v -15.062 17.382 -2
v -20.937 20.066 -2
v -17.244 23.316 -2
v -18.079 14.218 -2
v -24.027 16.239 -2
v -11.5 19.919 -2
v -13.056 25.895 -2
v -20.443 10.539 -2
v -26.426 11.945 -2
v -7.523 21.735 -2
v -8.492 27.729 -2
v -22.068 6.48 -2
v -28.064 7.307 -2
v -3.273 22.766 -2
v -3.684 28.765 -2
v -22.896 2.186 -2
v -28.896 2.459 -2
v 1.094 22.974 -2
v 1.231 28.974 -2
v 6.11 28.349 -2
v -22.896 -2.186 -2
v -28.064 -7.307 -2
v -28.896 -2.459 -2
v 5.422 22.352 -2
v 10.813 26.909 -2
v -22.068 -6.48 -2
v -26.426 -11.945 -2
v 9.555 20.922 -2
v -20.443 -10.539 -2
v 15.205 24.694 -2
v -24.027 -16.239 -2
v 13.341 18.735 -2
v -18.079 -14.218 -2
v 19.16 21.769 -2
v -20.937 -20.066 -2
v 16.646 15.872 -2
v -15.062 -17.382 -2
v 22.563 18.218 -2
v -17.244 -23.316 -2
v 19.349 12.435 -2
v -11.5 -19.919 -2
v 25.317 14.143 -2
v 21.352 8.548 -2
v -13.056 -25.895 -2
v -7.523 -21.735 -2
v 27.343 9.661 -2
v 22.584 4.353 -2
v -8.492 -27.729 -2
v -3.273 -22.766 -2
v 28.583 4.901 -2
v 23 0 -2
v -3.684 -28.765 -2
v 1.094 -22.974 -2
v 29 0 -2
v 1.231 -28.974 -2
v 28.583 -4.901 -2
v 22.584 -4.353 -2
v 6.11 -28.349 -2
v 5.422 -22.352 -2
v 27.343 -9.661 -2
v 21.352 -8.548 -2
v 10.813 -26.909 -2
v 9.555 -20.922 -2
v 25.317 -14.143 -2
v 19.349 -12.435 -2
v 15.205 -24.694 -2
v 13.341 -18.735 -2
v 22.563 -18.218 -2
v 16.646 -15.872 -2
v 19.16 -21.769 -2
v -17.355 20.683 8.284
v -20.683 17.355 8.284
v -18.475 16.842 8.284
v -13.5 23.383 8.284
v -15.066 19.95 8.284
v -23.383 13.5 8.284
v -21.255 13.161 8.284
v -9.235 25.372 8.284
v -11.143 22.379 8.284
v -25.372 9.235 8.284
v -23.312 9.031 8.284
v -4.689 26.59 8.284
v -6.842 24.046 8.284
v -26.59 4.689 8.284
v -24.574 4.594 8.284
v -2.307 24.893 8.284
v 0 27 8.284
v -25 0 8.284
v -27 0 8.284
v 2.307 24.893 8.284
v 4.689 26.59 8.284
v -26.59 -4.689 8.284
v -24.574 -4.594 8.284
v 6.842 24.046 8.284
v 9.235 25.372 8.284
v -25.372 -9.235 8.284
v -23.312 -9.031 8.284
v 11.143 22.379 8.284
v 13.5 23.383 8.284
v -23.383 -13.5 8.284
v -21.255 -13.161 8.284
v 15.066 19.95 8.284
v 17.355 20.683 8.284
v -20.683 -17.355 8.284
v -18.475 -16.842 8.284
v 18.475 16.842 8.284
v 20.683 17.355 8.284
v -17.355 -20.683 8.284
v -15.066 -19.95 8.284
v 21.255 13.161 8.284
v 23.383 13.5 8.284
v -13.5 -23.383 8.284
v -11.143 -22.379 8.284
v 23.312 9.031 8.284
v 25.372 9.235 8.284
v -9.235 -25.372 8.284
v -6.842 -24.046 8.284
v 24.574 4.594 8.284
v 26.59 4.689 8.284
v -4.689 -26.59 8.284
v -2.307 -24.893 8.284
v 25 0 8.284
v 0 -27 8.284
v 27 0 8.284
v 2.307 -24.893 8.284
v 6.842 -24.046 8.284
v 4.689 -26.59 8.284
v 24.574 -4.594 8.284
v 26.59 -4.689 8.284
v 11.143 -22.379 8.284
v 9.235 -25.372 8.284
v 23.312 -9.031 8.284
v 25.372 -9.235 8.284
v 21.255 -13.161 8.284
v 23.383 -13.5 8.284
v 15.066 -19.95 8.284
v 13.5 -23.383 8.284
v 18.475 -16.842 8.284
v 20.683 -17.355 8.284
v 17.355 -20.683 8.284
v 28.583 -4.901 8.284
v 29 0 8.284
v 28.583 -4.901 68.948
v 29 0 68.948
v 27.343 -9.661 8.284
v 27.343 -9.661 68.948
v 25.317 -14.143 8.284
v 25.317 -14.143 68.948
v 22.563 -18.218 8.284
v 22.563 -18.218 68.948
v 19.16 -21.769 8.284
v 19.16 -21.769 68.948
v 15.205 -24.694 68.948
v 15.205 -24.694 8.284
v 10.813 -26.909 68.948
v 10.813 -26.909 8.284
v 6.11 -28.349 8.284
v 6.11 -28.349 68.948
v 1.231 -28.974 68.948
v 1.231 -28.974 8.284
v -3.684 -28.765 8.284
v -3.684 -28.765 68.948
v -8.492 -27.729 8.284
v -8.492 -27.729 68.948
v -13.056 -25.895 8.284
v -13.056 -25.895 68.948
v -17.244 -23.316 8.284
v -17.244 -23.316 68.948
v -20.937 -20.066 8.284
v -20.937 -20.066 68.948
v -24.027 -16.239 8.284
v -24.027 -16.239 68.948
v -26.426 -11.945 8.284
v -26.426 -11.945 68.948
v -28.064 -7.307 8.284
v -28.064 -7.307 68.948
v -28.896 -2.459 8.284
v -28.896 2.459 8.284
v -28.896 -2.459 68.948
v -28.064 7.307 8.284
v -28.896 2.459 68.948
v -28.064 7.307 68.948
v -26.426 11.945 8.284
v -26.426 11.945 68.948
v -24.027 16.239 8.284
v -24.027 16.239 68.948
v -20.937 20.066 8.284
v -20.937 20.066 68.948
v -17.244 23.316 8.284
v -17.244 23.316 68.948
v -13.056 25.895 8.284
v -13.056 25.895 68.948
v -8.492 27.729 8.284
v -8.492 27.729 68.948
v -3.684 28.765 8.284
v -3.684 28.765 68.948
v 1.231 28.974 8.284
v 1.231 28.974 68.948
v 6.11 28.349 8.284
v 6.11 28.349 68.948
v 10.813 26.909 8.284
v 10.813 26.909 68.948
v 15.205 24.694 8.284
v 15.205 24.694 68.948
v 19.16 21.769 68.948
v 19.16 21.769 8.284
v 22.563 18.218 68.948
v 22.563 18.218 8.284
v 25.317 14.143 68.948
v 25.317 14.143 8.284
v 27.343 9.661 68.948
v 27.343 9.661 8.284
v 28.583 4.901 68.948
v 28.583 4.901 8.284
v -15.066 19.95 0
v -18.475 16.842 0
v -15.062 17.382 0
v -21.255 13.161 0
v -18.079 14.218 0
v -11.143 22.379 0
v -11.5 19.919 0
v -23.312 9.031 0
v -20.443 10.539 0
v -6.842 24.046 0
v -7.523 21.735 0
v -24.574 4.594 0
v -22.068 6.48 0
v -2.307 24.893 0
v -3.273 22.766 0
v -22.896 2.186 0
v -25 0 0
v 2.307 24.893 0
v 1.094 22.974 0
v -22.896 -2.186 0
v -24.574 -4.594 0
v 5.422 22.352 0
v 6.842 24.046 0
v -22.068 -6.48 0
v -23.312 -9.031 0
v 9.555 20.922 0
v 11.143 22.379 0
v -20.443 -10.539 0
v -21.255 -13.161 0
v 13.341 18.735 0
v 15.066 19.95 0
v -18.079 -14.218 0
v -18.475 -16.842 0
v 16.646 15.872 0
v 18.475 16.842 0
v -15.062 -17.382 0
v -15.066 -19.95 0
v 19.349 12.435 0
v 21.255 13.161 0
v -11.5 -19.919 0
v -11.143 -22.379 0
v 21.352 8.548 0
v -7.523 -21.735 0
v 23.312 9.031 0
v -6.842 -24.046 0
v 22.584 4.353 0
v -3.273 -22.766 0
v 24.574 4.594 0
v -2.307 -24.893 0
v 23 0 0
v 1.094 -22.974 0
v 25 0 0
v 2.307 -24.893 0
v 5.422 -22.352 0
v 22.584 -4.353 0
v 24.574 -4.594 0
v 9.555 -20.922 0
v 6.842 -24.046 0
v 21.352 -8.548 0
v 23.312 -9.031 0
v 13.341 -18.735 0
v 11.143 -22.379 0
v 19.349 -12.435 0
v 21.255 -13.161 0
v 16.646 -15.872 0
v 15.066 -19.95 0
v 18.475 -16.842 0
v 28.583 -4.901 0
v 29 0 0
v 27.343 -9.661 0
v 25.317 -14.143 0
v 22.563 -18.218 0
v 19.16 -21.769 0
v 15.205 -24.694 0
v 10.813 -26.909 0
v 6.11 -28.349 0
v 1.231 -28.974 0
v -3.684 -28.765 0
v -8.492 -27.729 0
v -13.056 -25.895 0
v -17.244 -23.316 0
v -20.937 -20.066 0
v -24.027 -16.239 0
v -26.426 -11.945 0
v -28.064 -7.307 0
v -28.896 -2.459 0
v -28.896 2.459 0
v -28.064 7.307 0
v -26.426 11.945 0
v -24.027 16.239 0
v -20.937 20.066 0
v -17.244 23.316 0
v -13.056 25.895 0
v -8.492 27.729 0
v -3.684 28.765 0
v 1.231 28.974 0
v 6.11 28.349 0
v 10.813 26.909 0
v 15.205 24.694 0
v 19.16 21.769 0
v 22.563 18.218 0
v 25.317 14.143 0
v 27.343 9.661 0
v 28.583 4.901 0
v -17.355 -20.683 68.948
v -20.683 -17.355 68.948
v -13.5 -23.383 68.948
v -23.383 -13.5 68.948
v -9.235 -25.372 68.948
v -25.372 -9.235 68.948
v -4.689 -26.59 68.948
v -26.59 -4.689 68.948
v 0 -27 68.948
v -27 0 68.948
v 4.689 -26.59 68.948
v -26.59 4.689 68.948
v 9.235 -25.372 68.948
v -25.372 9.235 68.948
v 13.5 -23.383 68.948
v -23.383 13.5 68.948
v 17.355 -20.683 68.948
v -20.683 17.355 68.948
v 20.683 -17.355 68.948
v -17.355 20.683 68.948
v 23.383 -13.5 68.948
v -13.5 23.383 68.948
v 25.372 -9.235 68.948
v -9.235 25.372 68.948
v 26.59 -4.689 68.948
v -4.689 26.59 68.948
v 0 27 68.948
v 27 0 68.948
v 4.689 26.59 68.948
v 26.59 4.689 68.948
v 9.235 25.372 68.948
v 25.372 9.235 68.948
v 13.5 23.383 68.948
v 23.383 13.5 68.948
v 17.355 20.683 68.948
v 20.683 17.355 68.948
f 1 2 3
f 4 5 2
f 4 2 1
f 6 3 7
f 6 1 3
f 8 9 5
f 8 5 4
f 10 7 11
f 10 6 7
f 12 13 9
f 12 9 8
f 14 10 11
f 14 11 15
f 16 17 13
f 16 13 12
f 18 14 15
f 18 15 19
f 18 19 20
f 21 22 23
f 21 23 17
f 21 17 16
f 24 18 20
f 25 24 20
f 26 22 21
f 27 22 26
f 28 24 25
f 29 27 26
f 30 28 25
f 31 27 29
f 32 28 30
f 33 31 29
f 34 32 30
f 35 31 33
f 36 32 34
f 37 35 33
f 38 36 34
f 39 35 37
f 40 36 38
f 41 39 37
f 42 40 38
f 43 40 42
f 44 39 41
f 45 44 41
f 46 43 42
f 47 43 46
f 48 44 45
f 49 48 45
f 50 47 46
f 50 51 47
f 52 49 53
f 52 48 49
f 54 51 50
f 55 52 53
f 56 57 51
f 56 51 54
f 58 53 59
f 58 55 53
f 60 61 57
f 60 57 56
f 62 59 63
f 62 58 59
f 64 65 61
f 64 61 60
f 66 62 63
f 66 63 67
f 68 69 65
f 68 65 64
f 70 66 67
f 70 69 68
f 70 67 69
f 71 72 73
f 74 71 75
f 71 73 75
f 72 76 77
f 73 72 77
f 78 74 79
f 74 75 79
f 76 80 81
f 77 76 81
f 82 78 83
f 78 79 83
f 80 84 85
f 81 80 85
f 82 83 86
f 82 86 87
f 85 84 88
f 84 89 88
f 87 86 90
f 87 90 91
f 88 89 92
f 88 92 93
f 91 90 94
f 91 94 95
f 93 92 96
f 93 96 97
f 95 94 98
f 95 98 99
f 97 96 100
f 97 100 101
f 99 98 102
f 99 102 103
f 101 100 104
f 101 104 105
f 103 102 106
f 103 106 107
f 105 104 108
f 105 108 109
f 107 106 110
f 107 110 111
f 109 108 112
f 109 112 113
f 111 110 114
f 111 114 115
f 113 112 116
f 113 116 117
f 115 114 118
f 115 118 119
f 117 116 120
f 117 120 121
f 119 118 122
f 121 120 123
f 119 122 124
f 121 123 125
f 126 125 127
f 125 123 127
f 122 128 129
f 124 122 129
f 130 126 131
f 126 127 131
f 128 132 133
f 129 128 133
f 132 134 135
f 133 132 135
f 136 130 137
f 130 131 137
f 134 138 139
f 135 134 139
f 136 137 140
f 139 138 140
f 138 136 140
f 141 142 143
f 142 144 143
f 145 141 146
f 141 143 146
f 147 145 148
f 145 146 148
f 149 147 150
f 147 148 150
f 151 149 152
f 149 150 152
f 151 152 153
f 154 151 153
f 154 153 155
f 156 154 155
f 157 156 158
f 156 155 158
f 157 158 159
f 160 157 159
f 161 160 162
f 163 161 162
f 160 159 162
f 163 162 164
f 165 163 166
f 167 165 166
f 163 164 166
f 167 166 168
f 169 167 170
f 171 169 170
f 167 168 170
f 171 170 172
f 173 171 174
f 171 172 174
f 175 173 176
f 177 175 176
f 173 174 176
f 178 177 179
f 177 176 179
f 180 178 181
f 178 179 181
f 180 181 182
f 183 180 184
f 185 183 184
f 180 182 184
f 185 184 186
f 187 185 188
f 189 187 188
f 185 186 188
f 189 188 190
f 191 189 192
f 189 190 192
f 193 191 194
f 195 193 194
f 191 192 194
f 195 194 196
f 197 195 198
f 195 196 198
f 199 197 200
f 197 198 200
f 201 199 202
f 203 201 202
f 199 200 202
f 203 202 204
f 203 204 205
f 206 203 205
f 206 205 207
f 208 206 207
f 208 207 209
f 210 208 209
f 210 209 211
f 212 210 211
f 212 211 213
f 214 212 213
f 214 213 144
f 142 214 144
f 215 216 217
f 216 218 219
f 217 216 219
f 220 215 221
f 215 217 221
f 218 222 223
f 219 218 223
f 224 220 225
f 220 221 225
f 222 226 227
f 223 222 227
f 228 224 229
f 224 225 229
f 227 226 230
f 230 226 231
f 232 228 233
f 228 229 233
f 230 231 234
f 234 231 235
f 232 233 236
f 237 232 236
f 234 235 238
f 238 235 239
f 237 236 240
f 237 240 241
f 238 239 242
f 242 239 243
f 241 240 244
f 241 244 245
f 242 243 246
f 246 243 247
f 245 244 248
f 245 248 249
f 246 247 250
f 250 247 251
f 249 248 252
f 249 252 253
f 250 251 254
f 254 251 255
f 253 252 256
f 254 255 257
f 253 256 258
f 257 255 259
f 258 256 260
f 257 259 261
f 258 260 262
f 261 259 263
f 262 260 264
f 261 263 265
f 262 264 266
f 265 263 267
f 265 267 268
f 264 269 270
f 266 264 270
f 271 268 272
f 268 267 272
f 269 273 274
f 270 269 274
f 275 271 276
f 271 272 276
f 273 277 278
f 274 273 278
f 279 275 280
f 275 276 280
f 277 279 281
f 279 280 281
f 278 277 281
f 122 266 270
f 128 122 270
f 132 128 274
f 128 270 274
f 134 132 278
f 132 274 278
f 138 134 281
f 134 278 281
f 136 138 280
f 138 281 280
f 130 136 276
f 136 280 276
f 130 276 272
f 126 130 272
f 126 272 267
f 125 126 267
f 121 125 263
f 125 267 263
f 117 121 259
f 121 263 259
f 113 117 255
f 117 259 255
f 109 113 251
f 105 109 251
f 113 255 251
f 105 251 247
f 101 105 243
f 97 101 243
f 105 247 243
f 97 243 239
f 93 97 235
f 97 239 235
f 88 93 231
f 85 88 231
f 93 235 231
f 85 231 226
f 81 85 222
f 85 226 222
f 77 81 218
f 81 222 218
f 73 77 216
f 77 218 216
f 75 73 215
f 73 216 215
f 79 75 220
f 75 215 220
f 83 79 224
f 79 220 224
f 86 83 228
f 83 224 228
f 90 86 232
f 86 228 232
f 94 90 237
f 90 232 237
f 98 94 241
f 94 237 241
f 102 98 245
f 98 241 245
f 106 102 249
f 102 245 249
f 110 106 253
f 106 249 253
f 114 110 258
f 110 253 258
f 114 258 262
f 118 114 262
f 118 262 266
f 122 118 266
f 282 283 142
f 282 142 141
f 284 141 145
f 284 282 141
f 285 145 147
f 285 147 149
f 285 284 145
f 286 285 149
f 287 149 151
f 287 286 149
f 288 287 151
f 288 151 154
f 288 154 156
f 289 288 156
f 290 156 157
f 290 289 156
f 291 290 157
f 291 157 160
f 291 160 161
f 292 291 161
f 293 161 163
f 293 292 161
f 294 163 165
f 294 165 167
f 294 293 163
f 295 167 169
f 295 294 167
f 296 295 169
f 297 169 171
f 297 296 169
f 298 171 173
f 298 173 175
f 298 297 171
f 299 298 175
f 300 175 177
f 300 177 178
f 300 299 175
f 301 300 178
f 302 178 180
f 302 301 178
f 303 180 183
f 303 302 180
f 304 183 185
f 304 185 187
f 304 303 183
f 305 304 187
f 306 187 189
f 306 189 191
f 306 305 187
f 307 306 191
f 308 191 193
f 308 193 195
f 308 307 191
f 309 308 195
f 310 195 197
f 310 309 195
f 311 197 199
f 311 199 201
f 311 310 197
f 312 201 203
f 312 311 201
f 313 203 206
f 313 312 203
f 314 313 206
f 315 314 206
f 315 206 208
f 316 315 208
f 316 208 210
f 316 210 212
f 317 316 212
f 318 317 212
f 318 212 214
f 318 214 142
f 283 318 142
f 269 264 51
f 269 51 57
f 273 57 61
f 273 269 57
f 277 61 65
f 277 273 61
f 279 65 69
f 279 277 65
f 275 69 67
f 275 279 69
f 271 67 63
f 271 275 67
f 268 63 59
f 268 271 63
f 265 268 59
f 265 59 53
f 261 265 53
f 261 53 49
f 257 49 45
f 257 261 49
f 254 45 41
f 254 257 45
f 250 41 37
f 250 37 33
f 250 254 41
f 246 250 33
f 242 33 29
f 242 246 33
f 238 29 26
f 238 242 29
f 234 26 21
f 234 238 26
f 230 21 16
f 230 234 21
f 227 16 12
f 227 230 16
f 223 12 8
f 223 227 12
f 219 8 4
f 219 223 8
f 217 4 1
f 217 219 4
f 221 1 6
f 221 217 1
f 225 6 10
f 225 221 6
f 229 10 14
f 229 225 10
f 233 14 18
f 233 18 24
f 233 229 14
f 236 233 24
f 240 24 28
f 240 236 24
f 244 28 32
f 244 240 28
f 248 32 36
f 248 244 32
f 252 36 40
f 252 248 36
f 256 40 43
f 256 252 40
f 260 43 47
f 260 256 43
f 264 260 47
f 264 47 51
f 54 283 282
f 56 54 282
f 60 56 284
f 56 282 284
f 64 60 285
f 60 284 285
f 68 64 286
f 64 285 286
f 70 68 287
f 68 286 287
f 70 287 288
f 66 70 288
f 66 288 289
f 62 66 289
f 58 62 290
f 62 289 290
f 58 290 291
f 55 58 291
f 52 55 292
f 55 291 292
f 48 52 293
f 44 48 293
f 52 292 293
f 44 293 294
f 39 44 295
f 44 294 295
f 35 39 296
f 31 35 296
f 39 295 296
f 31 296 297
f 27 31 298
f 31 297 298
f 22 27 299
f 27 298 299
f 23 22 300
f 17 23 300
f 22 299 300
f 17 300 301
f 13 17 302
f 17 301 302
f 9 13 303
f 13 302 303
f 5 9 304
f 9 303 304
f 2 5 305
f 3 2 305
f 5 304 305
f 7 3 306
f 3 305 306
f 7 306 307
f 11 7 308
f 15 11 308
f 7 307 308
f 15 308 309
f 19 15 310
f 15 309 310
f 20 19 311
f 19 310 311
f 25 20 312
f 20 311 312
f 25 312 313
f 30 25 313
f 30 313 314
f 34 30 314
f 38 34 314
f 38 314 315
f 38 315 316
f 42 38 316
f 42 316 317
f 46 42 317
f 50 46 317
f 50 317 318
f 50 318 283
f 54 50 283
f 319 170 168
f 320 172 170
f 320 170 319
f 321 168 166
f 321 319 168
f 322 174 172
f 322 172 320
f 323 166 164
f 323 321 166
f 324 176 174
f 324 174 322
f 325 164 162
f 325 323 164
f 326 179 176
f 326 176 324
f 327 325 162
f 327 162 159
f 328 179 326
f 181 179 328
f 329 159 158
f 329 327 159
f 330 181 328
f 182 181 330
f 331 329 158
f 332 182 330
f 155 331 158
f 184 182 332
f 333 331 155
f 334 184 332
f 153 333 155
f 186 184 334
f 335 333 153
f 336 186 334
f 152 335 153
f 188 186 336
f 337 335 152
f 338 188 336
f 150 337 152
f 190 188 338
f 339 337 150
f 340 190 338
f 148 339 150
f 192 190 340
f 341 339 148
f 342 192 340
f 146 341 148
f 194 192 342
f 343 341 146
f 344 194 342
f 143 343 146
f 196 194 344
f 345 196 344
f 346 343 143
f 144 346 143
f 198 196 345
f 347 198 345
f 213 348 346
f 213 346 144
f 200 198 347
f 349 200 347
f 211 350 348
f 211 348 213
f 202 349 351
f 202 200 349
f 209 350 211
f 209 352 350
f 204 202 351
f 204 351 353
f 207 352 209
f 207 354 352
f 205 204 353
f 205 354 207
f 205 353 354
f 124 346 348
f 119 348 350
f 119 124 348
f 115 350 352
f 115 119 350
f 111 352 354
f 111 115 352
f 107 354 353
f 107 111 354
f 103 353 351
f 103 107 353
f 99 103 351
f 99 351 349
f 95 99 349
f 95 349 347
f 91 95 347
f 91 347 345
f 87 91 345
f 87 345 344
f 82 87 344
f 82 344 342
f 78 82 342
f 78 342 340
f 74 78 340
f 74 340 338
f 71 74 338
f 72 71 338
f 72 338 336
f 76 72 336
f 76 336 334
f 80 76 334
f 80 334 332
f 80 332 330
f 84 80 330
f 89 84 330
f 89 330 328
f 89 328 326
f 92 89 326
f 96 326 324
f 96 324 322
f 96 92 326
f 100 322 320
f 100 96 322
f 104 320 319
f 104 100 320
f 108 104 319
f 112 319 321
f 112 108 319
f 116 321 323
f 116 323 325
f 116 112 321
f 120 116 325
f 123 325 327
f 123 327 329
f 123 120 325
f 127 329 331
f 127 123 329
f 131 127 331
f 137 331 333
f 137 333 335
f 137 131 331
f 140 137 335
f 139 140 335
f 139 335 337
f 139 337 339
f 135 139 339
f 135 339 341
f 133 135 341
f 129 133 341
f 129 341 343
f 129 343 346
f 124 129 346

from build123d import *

# Parameters (mm, degrees)
F1_R     = 29
F1_R_2   = 27
F2_DEPTH = 68.948
F3_R     = 29
F3_R_2   = 25
F3_R_3   = 23
F4_DEPTH = 2
F5_DEPTH = 8.284


with BuildPart() as f2:
    # F1 (on face) → F2 (new body)
    with BuildSketch(Plane.XY):
        Circle(F1_R)
        Circle(F1_R_2, mode=Mode.SUBTRACT)
    extrude(amount=F2_DEPTH)

    # F3 (on face) → F4 (join)
    with BuildSketch(Plane(origin=(0, 0, 0), x_dir=(1, 0, 0), z_dir=(0, 0, -1))):
        Circle(F3_R)
        Circle(F3_R_2, mode=Mode.SUBTRACT)
        Circle(F3_R_2)
        Circle(F3_R_3, mode=Mode.SUBTRACT)
    extrude(amount=F4_DEPTH)

    # F3 (on face) → F5 (join)
    with BuildSketch(Plane(origin=(0, 0, 0), x_dir=(1, 0, 0), z_dir=(0, 0, -1))):
        Circle(F3_R)
        Circle(F3_R_2, mode=Mode.SUBTRACT)
    extrude(amount=-F5_DEPTH)


solid = f2.part
